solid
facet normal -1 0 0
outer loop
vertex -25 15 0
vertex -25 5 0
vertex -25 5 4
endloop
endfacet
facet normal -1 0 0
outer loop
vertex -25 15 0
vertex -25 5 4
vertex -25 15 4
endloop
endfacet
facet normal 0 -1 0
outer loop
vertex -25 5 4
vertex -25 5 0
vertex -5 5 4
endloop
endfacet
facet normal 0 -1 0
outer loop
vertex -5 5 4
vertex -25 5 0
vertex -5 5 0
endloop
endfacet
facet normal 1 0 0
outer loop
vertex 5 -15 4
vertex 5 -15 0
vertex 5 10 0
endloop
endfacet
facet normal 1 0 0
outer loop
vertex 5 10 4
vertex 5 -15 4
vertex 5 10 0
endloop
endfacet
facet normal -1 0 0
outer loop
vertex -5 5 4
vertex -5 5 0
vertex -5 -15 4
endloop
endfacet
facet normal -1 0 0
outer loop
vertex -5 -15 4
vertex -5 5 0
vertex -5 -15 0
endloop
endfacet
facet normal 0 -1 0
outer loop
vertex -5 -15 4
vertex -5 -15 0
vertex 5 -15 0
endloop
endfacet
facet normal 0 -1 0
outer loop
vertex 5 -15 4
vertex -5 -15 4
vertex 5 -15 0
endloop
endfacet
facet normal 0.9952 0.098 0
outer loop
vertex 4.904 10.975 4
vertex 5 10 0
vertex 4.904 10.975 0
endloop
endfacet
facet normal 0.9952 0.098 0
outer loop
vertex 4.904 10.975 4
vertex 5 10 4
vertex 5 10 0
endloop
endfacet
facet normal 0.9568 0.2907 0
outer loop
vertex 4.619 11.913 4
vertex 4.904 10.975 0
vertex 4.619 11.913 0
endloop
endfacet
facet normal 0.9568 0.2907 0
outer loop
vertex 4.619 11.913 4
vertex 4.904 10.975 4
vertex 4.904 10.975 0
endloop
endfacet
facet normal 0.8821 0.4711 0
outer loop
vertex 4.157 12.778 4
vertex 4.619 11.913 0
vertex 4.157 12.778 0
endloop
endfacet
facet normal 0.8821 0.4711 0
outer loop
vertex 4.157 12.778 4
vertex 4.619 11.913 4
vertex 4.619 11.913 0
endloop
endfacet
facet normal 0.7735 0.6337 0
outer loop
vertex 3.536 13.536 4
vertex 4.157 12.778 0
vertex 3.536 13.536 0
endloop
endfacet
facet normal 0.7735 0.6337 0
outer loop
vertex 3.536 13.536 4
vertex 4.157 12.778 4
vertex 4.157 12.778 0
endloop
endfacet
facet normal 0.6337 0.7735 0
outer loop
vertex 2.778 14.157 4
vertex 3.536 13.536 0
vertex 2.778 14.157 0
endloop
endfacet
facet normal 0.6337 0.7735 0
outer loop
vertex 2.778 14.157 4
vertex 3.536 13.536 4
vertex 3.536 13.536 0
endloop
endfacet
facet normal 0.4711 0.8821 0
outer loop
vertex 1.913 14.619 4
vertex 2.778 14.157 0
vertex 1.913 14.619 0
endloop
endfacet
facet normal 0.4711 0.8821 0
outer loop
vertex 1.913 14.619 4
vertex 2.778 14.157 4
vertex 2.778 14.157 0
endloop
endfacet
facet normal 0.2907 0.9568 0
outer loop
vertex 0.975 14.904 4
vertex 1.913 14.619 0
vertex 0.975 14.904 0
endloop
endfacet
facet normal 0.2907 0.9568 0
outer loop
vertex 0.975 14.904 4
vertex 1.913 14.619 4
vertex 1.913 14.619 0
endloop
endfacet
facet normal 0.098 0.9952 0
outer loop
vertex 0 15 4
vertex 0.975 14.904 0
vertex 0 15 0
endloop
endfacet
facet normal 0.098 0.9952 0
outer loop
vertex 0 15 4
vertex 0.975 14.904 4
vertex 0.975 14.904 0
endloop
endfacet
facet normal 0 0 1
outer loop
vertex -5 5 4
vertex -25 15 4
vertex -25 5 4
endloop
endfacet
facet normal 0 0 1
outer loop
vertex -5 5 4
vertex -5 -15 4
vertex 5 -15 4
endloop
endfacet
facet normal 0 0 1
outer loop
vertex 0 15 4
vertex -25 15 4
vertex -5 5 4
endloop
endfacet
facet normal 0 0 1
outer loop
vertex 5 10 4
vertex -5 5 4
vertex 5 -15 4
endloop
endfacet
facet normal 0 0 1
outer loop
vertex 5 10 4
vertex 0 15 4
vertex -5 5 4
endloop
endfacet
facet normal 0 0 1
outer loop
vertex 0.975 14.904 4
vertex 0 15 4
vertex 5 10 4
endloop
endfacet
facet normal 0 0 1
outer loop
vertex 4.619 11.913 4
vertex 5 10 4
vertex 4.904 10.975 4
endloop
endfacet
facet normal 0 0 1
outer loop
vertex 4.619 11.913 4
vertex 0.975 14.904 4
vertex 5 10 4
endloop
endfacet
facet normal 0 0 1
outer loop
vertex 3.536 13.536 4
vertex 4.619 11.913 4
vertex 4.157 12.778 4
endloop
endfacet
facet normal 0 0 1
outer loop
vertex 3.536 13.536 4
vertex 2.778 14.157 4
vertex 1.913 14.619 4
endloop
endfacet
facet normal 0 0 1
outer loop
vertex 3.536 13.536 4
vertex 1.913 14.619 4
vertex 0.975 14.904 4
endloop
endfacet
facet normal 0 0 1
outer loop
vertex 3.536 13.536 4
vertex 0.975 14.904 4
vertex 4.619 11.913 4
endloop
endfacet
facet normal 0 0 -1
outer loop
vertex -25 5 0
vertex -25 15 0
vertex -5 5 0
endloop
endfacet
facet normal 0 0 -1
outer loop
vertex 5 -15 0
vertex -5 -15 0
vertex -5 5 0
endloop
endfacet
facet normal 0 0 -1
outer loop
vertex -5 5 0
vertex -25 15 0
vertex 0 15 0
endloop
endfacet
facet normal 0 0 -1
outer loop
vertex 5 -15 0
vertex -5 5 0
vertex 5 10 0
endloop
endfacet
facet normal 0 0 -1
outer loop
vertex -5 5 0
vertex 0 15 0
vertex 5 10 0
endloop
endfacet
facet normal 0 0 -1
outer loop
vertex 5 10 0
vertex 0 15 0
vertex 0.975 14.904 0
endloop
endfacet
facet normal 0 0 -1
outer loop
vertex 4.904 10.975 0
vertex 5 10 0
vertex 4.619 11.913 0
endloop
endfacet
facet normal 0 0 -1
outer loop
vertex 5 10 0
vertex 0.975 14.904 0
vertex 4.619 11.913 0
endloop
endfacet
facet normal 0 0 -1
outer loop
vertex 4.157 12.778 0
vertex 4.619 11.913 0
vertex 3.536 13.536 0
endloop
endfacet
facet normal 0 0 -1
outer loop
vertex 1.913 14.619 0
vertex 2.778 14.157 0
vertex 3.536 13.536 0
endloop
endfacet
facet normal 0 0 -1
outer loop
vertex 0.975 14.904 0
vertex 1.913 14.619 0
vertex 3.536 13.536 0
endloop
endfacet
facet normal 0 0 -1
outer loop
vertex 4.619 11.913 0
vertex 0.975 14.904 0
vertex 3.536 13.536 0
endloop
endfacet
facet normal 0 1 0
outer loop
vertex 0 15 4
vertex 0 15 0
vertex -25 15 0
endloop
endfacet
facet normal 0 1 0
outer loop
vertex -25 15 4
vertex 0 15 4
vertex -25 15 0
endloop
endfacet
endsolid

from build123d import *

# Parameters (mm, degrees)
F0_W     = 20
F0_H     = 10
F1_DEPTH = 4
F2_R     = 5


with BuildPart() as f1:
    # F0 (on Top) → F1 (new body)
    with BuildSketch(Plane.XY):
        Polygon((5, -15), (5, 15), (-5, 15), (-5, 5), (-5, -15), align=None)
        with Locations((-15, 10)):
            Rectangle(F0_W, F0_H)
    extrude(amount=F1_DEPTH)

    # F2
    f2_edges = [f1.edges().sort_by_distance(p)[0] for p in [
        (5, 15, 2),
    ]]
    fillet(f2_edges, radius=F2_R)


solid = f1.part
